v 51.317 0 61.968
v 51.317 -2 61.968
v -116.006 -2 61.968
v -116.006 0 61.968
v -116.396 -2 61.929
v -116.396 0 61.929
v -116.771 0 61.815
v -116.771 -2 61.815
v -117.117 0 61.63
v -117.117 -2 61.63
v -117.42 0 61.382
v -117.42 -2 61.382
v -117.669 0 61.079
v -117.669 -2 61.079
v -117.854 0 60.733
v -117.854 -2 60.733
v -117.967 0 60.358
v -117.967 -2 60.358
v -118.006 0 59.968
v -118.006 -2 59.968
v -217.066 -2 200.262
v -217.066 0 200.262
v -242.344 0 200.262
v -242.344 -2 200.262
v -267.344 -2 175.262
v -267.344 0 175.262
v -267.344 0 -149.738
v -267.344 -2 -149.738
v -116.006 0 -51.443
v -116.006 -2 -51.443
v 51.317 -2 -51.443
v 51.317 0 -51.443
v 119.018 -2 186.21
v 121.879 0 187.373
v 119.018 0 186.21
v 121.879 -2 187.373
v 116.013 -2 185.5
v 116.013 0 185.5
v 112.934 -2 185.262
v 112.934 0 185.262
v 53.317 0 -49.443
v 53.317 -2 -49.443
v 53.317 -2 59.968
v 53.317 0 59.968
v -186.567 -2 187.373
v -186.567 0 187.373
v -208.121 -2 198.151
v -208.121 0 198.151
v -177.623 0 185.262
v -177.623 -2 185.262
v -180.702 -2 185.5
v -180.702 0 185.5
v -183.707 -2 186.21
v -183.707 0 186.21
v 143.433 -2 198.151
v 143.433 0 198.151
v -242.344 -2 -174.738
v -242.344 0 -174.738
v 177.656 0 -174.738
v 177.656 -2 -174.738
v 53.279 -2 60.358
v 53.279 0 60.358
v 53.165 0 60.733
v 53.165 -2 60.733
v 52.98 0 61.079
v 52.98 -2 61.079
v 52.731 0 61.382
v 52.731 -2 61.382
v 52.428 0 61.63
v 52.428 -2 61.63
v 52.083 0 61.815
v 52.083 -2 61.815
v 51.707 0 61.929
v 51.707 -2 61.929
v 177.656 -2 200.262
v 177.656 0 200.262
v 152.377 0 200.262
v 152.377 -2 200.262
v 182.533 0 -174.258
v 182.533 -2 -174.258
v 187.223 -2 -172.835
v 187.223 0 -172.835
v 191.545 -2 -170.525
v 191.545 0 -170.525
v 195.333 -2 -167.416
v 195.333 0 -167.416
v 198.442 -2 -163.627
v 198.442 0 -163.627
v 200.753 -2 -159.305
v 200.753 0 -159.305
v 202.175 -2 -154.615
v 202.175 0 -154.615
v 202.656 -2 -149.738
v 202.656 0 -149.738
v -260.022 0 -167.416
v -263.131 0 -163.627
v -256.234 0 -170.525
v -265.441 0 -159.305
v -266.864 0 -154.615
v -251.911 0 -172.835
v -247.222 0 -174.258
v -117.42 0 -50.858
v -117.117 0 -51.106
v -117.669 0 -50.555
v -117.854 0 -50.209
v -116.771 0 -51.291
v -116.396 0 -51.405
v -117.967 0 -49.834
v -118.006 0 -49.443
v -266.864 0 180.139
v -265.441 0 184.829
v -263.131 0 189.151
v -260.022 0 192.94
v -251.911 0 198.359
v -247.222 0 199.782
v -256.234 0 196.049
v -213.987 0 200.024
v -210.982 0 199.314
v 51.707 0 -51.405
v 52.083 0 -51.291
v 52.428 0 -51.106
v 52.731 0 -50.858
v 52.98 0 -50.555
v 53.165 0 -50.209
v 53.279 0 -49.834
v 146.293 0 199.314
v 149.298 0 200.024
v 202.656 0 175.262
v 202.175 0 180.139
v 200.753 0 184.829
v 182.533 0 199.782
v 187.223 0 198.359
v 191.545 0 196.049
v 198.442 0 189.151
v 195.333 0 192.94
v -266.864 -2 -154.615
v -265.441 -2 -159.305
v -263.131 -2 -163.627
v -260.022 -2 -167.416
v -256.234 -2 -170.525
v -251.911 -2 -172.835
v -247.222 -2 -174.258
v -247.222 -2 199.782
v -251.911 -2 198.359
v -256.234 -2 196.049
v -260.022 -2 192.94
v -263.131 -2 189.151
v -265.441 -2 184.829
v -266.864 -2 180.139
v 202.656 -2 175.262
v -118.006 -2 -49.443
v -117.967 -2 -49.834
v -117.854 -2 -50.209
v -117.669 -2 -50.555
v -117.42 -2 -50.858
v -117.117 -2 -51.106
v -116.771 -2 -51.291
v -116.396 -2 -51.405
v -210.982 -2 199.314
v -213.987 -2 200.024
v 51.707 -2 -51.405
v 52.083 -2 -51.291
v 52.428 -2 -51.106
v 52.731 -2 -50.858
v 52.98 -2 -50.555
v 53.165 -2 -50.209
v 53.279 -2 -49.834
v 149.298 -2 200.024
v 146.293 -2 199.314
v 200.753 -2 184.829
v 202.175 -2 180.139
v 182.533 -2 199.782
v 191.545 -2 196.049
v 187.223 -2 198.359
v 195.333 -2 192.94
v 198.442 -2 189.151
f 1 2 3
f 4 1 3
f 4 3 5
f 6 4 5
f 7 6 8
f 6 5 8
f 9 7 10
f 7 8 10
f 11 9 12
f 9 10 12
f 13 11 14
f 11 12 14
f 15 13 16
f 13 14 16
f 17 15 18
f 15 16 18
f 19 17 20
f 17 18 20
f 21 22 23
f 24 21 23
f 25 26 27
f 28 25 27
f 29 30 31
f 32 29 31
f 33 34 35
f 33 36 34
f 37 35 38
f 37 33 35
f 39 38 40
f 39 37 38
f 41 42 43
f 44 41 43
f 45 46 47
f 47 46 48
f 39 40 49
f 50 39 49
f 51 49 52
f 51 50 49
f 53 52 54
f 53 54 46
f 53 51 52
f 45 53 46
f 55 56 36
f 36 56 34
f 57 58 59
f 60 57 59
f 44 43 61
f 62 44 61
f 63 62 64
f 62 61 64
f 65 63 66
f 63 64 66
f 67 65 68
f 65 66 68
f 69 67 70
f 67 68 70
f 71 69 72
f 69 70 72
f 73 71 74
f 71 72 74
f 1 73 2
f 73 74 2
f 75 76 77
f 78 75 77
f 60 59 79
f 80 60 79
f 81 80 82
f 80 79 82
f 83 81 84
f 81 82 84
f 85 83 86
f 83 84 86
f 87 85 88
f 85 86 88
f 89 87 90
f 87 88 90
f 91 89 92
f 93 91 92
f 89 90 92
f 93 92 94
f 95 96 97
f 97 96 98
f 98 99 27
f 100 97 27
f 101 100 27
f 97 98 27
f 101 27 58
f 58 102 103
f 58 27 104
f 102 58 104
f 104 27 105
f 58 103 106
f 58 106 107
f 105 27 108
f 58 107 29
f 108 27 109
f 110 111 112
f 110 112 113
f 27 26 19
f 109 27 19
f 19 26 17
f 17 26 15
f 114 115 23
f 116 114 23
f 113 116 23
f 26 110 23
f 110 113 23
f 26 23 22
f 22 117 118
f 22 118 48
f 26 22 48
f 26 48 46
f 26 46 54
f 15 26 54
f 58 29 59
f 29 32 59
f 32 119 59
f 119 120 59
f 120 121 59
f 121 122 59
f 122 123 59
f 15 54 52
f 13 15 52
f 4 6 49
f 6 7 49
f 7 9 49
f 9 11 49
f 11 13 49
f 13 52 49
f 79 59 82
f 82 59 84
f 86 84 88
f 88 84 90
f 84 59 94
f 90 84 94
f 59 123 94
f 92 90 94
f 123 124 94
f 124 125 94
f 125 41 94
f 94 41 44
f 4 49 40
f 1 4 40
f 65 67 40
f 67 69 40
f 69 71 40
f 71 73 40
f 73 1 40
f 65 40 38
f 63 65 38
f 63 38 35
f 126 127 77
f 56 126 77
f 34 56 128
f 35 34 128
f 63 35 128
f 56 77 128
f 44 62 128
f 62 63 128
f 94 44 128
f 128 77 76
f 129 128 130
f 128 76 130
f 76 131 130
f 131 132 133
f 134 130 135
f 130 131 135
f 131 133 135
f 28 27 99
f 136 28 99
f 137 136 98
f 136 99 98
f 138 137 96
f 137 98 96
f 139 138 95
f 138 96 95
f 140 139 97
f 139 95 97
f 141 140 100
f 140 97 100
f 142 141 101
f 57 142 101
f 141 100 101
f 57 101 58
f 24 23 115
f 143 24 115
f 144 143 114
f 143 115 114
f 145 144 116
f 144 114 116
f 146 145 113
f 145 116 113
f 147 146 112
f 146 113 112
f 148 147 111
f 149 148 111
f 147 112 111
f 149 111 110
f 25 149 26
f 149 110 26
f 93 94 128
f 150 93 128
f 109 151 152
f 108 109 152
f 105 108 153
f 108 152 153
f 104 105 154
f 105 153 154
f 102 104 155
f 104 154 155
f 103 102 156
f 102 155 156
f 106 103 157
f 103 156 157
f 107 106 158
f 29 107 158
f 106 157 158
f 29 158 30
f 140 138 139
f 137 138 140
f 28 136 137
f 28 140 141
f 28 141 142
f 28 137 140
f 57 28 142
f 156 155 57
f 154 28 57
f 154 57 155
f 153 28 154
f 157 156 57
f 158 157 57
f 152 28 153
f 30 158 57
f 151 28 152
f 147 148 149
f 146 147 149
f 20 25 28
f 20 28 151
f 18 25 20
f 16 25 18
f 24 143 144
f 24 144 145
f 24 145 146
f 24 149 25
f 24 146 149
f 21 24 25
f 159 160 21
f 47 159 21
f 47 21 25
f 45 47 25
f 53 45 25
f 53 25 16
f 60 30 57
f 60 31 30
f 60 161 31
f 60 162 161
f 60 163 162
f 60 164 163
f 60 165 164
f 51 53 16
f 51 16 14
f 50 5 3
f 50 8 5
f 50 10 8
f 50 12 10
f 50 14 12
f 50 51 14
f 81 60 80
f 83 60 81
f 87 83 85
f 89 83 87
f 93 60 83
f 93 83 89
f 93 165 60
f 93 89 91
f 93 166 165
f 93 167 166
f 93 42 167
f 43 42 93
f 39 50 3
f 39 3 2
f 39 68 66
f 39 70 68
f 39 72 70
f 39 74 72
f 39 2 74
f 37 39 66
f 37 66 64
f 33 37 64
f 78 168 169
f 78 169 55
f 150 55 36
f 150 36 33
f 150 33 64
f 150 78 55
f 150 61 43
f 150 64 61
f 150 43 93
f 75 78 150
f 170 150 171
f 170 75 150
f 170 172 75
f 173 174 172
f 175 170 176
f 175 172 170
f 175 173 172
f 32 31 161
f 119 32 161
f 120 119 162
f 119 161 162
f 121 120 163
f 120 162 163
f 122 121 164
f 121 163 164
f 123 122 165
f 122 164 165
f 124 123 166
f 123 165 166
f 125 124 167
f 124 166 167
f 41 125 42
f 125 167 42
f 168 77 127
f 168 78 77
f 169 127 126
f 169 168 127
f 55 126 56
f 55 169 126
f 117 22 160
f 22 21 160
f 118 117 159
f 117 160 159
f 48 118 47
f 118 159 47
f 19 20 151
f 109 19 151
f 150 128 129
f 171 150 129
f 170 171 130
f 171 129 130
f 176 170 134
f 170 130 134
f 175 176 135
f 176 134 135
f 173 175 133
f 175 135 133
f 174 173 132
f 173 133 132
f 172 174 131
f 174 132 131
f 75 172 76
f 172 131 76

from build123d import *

# Parameters (mm, degrees)
F1_DEPTH = 2
F3_DEPTH = 25.4
F4_R     = 20


with BuildPart() as f1:
    # F0 (on Front) → F1 (new body)
    with BuildSketch(Plane.XZ):
        with BuildLine():
            ThreePointArc((177.655664, -174.737987), (195.333333, -167.415657), (202.655664, -149.737987))
            Line((202.655664, -149.737987), (202.655664, 175.262013))
            ThreePointArc((202.655664, 175.262013), (195.333333, 192.939682), (177.655664, 200.262013))
            Line((177.655664, 200.262013), (147.655664, 200.262013))
            Line((147.655664, 200.262013), (117.655664, 185.262013))
            Line((117.655664, 185.262013), (-32.344336, 185.262013))
            Line((-32.344336, 185.262013), (-182.344336, 185.262013))
            Line((-182.344336, 185.262013), (-212.344336, 200.262013))
            Line((-212.344336, 200.262013), (-242.344336, 200.262013))
            ThreePointArc((-242.344336, 200.262013), (-260.022006, 192.939682), (-267.344336, 175.262013))
            Line((-267.344336, 175.262013), (-267.344336, -149.737987))
            ThreePointArc((-267.344336, -149.737987), (-260.022006, -167.415657), (-242.344336, -174.737987))
            Line((-242.344336, -174.737987), (177.655664, -174.737987))
        make_face()
    extrude(amount=F1_DEPTH)

    # F2 (on face) → F3 (cut)
    with BuildSketch(Plane.XZ.offset(2)):
        with BuildLine():
            Line((-116.005836, -51.443487), (51.317164, -51.443487))
            ThreePointArc((51.317164, -51.443487), (52.731377, -50.857701), (53.317164, -49.443487))
            Line((53.317164, -49.443487), (53.317164, 59.967513))
            ThreePointArc((53.317164, 59.967513), (52.731377, 61.381726), (51.317164, 61.967513))
            Line((51.317164, 61.967513), (-116.005836, 61.967513))
            ThreePointArc((-116.005836, 61.967513), (-117.42005, 61.381726), (-118.005836, 59.967513))
            Line((-118.005836, 59.967513), (-118.005836, -49.443487))
            ThreePointArc((-118.005836, -49.443487), (-117.42005, -50.857701), (-116.005836, -51.443487))
        make_face()
    extrude(amount=-F3_DEPTH, mode=Mode.SUBTRACT)

    # F4
    f4_edges = [f1.edges().sort_by_distance(p)[0] for p in [
        (147.655664, -1, 200.262013),
        (117.655664, -1, 185.262013),
        (-212.344336, -1, 200.262013),
        (-182.344336, -1, 185.262013),
    ]]
    fillet(f4_edges, radius=F4_R)


solid = f1.part
